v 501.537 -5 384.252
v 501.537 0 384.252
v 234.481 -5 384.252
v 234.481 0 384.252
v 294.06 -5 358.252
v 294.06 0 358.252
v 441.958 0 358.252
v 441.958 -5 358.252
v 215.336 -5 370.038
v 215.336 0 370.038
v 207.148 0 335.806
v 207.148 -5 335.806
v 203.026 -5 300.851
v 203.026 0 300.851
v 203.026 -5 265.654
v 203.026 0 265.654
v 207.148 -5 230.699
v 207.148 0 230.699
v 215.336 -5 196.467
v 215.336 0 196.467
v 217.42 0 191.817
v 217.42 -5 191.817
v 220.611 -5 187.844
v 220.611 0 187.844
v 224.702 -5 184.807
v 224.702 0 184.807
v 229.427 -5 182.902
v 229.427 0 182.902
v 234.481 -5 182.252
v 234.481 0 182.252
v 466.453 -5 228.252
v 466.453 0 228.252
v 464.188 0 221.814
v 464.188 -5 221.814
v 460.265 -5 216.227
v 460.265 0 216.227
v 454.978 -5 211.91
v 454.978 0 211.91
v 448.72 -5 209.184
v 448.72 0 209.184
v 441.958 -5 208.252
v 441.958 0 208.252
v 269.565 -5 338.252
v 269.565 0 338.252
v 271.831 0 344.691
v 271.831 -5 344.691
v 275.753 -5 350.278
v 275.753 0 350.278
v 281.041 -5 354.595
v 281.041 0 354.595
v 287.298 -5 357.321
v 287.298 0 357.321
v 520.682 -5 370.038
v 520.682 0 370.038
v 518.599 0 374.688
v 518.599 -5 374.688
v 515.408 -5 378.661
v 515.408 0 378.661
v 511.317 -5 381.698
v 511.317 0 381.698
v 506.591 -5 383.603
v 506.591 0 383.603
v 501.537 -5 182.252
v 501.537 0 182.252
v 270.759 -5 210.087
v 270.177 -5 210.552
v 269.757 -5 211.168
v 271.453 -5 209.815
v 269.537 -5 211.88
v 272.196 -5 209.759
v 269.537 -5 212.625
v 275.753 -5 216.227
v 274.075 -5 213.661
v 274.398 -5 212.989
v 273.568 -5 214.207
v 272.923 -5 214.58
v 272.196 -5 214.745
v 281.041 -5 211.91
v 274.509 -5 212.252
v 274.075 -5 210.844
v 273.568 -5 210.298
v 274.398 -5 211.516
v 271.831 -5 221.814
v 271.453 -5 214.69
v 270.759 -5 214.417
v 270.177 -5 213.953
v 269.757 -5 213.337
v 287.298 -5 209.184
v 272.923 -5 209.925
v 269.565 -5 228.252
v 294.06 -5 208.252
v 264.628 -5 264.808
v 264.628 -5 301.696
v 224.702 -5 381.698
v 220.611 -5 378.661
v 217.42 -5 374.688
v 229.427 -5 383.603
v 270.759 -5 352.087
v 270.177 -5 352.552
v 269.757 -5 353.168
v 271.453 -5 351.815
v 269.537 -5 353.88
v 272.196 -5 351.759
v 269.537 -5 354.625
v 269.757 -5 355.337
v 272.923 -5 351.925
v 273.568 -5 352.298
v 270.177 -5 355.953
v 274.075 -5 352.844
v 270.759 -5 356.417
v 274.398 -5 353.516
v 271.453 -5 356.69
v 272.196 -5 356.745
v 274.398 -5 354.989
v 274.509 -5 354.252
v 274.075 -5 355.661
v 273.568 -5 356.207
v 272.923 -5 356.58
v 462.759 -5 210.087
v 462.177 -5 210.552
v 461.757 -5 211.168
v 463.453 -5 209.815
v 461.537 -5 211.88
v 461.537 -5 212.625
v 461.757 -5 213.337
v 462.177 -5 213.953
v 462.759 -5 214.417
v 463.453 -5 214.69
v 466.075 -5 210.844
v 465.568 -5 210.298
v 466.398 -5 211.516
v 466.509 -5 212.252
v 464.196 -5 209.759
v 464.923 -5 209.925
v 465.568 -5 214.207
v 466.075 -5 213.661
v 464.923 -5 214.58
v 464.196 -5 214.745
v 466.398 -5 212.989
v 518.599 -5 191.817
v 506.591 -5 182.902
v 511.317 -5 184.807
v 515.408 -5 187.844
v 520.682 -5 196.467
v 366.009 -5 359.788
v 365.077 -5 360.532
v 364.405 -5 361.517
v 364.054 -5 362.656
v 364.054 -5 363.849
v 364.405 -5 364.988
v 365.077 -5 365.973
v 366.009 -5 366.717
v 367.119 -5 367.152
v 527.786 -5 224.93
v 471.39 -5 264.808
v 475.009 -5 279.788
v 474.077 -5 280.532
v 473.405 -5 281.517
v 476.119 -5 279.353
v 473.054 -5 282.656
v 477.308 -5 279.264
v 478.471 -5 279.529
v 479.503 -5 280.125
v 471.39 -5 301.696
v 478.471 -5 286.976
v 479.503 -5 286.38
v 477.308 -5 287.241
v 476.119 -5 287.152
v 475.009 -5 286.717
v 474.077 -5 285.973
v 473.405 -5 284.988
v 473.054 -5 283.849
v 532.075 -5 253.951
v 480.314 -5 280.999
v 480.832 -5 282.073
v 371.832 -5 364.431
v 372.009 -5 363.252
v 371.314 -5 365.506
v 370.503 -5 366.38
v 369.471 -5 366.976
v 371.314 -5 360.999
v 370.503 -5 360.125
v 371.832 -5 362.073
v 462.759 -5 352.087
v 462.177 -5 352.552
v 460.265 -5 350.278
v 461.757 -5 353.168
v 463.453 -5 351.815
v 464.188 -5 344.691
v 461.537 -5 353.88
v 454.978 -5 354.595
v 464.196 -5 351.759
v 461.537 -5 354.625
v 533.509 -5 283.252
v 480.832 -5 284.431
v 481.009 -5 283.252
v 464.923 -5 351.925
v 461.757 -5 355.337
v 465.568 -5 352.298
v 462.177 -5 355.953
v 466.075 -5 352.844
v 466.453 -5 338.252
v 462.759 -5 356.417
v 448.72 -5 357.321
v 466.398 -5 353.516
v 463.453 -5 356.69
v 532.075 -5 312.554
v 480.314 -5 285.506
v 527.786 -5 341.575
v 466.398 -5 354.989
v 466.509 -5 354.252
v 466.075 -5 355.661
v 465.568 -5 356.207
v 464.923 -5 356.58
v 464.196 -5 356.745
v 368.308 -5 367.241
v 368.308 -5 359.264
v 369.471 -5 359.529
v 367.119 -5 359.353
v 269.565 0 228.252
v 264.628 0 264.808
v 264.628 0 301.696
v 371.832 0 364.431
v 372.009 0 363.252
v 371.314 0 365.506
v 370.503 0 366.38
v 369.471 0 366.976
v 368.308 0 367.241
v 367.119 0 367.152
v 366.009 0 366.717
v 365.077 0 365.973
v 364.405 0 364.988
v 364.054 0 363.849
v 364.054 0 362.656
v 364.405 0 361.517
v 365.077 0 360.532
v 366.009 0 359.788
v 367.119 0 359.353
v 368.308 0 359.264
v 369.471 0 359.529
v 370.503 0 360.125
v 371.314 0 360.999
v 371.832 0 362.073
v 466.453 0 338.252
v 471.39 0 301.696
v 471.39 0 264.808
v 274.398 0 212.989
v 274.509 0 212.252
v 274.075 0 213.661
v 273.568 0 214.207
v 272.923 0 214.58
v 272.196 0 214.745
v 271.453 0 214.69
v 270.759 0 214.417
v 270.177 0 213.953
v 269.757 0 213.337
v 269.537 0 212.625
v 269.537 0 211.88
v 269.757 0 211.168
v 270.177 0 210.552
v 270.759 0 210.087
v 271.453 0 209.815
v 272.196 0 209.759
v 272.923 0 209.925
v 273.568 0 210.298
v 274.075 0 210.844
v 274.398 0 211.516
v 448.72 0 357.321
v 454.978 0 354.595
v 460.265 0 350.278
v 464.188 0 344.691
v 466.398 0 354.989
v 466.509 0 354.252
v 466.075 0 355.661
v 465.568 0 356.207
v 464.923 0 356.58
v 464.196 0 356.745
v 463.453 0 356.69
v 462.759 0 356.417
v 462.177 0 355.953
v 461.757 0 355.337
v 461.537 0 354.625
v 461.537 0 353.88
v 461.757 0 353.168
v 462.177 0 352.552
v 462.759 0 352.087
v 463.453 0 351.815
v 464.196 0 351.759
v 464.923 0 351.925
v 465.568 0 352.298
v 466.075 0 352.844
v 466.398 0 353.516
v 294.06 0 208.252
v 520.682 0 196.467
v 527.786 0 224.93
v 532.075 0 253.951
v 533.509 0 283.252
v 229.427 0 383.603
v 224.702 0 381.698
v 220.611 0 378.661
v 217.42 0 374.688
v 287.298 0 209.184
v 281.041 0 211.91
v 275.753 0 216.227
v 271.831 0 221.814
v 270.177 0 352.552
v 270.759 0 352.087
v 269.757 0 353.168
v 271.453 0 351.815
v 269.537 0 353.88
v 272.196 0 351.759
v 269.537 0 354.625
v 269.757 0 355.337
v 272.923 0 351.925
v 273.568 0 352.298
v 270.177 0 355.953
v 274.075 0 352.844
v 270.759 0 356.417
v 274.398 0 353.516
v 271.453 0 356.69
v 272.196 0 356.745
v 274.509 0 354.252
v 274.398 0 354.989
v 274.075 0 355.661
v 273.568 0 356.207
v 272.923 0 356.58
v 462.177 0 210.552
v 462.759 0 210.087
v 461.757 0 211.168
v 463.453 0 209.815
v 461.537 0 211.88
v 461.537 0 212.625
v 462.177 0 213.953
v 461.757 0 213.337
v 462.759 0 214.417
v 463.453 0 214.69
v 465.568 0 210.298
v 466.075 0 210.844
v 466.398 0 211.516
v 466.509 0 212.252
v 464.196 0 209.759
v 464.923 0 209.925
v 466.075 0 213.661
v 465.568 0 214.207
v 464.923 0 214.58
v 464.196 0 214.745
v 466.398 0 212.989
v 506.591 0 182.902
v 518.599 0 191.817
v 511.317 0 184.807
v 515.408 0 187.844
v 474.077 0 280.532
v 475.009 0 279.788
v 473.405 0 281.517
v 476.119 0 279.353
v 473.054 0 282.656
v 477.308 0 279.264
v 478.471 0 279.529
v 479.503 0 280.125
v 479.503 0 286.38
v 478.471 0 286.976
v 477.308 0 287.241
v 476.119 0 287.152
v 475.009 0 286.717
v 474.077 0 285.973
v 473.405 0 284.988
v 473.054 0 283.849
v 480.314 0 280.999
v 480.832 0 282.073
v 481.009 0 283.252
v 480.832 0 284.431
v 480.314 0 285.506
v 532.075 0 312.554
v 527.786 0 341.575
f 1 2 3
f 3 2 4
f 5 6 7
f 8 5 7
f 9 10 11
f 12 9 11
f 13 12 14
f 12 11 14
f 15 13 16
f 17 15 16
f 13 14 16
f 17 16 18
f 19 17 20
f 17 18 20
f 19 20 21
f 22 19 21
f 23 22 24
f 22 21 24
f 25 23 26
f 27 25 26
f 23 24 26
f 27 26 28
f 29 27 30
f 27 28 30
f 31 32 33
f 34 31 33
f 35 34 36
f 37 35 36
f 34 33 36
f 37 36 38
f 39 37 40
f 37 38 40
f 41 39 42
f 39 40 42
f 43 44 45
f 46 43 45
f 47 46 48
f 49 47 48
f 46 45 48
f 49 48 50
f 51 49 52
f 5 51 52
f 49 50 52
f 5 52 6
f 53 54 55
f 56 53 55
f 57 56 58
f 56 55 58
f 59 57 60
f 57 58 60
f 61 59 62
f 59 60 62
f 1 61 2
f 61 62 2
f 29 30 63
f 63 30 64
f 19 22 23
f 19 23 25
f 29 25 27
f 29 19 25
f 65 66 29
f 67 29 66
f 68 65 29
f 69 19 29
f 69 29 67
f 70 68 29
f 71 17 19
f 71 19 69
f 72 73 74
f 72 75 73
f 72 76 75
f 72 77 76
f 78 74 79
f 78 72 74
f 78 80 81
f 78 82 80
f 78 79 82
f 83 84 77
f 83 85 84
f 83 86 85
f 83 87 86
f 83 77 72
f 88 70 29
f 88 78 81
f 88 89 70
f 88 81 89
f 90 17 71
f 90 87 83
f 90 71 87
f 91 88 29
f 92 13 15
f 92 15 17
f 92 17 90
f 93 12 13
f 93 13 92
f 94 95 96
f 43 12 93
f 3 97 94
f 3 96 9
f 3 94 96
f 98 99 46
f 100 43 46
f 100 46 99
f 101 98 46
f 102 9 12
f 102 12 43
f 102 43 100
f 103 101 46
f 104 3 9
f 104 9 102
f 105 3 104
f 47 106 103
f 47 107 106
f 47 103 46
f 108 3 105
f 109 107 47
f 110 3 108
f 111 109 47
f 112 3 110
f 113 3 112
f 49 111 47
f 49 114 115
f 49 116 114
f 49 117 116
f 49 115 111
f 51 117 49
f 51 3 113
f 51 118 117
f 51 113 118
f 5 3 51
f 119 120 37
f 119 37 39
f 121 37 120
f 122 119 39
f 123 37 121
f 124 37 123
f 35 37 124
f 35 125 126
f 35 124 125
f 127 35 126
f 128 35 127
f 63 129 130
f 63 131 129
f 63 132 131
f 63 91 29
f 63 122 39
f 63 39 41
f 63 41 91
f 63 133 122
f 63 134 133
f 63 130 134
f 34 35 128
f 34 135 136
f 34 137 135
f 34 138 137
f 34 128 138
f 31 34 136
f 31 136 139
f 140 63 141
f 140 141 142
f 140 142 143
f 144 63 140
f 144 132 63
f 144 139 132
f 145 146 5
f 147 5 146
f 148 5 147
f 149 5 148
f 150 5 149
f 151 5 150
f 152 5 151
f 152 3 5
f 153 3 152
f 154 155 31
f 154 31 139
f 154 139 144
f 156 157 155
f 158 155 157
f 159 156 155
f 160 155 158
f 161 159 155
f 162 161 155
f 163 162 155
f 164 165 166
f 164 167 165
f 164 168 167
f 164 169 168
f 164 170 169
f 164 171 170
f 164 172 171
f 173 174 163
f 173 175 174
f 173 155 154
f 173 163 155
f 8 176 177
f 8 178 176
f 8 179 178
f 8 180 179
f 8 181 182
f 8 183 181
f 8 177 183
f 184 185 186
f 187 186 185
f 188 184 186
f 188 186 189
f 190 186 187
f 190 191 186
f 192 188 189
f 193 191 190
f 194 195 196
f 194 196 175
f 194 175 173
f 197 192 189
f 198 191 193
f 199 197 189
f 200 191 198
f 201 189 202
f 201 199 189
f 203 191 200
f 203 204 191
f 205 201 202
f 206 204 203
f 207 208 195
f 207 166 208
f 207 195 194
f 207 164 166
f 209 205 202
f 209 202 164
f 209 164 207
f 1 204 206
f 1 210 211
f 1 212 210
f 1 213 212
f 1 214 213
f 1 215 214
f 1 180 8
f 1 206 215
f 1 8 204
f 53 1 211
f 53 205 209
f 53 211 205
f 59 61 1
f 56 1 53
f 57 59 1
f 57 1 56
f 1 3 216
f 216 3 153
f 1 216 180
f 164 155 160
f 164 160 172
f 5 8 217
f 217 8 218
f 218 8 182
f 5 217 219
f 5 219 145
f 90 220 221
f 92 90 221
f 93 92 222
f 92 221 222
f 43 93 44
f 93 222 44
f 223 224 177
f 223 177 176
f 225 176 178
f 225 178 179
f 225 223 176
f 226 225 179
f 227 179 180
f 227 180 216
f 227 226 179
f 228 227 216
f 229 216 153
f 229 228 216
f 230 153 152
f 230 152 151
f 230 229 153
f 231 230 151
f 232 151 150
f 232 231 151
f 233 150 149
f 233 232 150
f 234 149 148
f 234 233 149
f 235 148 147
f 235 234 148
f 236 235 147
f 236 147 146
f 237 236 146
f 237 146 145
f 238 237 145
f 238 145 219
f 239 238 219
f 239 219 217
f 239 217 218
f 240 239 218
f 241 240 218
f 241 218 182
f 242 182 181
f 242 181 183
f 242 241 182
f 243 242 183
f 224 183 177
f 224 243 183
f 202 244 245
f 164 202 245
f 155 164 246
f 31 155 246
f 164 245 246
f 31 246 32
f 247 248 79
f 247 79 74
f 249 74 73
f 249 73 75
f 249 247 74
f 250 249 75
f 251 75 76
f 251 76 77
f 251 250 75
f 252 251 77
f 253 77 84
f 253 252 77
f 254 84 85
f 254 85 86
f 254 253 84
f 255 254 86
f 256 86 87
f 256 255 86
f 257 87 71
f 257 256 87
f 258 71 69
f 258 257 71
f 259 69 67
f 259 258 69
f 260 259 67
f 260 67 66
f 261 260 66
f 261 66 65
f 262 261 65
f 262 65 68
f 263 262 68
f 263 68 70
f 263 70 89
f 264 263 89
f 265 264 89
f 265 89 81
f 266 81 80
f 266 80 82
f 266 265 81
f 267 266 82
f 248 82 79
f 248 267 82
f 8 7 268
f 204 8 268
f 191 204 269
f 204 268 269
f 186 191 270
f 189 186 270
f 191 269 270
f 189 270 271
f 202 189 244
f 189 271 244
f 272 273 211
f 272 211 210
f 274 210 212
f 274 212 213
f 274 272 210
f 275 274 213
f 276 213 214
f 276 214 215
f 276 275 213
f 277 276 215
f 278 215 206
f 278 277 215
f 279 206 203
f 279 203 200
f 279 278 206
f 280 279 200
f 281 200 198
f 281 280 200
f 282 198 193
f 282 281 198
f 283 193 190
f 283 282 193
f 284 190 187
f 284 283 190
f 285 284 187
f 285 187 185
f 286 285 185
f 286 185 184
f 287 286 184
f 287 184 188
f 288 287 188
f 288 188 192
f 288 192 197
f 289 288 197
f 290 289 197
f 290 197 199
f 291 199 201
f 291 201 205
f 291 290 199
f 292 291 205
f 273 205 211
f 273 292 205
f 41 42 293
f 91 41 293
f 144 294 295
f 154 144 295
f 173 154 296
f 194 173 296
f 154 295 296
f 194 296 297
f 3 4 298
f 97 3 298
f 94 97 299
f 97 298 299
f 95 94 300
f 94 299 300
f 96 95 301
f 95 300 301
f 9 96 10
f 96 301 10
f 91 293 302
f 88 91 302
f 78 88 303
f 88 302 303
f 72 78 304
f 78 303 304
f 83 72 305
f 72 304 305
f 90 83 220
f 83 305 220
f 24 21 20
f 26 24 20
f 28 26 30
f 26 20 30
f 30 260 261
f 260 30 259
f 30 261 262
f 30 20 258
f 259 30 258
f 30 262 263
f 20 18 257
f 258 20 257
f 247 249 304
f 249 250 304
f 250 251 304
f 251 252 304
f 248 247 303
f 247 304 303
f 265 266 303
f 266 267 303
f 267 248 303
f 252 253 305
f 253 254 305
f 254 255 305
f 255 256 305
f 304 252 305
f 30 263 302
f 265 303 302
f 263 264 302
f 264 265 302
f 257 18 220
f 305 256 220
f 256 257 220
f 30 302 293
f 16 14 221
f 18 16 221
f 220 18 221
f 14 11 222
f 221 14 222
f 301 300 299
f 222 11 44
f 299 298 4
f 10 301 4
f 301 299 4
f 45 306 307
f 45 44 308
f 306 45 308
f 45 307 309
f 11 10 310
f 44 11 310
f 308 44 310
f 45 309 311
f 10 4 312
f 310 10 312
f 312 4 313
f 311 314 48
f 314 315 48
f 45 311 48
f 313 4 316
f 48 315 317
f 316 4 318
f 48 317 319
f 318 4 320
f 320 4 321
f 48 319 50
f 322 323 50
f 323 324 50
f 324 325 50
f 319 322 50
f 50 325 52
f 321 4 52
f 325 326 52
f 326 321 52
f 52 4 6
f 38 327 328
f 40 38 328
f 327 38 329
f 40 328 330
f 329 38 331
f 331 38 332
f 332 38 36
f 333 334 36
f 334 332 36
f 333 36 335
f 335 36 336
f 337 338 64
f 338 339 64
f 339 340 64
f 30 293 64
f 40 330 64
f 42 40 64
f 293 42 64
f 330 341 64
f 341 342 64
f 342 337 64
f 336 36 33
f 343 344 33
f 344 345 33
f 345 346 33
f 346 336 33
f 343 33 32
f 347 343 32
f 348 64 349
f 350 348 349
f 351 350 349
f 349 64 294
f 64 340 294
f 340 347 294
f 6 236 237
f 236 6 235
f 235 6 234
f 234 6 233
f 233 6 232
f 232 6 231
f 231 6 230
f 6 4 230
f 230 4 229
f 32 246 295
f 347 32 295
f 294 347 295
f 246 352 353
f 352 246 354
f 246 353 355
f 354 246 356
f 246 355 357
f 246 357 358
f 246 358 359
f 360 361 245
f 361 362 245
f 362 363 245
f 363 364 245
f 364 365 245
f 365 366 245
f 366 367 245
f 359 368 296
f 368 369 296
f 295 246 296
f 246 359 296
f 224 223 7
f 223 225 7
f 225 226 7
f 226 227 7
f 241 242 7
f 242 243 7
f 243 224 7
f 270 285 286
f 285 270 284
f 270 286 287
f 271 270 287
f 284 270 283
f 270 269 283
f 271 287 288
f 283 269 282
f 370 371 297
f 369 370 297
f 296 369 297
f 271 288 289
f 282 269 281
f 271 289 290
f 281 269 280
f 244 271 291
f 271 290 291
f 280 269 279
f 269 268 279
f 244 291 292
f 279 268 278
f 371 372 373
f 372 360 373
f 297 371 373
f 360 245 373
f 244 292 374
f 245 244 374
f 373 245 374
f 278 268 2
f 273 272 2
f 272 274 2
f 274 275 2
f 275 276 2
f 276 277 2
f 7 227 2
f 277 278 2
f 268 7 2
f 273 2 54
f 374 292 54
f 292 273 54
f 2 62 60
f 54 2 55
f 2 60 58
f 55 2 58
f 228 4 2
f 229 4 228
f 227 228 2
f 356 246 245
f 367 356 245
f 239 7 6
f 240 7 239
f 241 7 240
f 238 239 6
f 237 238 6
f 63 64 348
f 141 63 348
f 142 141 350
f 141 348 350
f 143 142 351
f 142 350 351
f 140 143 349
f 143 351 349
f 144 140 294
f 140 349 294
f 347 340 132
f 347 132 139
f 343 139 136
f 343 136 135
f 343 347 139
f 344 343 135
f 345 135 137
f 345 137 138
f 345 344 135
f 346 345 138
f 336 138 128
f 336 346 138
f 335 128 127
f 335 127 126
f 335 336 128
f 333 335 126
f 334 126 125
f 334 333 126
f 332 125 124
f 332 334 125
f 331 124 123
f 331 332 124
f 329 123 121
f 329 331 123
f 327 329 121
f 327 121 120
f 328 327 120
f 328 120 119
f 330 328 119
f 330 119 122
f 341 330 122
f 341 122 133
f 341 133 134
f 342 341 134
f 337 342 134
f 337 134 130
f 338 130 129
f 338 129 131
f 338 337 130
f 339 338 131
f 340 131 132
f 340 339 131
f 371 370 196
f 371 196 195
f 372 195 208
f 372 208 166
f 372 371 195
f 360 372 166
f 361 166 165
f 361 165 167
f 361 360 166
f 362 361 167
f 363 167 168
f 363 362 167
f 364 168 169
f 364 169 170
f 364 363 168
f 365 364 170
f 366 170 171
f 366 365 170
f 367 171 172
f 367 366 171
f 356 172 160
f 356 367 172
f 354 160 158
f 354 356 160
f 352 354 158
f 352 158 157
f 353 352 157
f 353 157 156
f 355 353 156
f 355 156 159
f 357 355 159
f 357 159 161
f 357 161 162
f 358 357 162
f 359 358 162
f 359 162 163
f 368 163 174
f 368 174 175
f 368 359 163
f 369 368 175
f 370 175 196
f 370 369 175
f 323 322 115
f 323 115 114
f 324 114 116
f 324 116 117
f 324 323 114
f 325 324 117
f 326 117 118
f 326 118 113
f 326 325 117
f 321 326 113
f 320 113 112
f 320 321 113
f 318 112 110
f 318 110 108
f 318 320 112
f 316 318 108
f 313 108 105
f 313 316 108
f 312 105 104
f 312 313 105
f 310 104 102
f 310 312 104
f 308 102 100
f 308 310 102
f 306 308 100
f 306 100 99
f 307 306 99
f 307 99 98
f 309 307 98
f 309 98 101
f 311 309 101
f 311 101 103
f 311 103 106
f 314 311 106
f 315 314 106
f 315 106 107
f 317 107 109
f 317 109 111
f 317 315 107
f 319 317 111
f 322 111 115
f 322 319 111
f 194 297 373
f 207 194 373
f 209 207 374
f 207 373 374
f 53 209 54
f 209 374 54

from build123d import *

# Parameters (mm, degrees)
F0_R     = 2.5
F0_R_2   = 4
F1_DEPTH = 5


# Not quite as in the source:
# - ends of sketch curves that miss each other by under 0.0002 mm in the source are joined


with BuildPart() as f1:
    # F0 (on Front) → F1 (new body)
    with BuildSketch(Plane.XZ):
        with BuildLine():
            ThreePointArc((215.3364533002, 370.0381469093), (202.5092928068, 283.2524328558), (215.3364530138, 196.4667187599))
            ThreePointArc((215.3364530138, 196.4667187599), (222.5589410473, 186.1945021744), (234.481309, 182.252433))
            Line((234.481309, 182.252433), (501.537276, 182.252433))
            ThreePointArc((501.537276, 182.252433), (513.4596440465, 186.1945022441), (520.6821320538, 196.4667189837))
            ThreePointArc((520.6821320538, 196.4667189837), (530.2851775529, 239.3881650909), (533.5092924377, 283.2524341717))
            ThreePointArc((533.5092924377, 283.2524341717), (530.2851774064, 327.11670224), (520.6821320538, 370.0381473561))
            ThreePointArc((520.6821320538, 370.0381473561), (513.4596440465, 380.3103637559), (501.537276, 384.252433))
            Line((501.537276, 384.252433), (234.481309, 384.252433))
            ThreePointArc((234.481309, 384.252433), (222.5589409535, 380.3103637559), (215.3364533002, 370.0381469093))
        make_face()
        with Locations((272.009293, 212.252433)):
            Circle(F0_R, mode=Mode.SUBTRACT)
        with BuildLine():
            ThreePointArc((466.4531644107, 228.2524329162), (457.7696552677, 213.8875162419), (441.958267, 208.252433))
            Line((441.958267, 208.252433), (294.060318, 208.252433))
            ThreePointArc((294.060318, 208.252433), (278.2489297323, 213.8875162419), (269.5654205893, 228.2524329162))
            ThreePointArc((269.5654205893, 228.2524329162), (264.009293, 283.252433), (269.5654212821, 338.2524329424))
            ThreePointArc((269.5654212821, 338.2524329424), (278.2489297323, 352.6173497581), (294.060318, 358.252433))
            Line((294.060318, 358.252433), (441.958267, 358.252433))
            ThreePointArc((441.958267, 358.252433), (457.7696552677, 352.6173497581), (466.4531644107, 338.2524330838))
            ThreePointArc((466.4531644107, 338.2524330838), (472.009293, 283.252433), (466.4531644107, 228.2524329162))
        make_face(mode=Mode.SUBTRACT)
        with Locations((272.009293, 354.252433)):
            Circle(F0_R, mode=Mode.SUBTRACT)
        with Locations((368.009293, 363.252433)):
            Circle(F0_R_2, mode=Mode.SUBTRACT)
        with Locations((464.009293, 212.252433)):
            Circle(F0_R, mode=Mode.SUBTRACT)
        with Locations((477.009293, 283.252433)):
            Circle(F0_R_2, mode=Mode.SUBTRACT)
        with Locations((464.009293, 354.252433)):
            Circle(F0_R, mode=Mode.SUBTRACT)
    extrude(amount=F1_DEPTH)


solid = f1.part
